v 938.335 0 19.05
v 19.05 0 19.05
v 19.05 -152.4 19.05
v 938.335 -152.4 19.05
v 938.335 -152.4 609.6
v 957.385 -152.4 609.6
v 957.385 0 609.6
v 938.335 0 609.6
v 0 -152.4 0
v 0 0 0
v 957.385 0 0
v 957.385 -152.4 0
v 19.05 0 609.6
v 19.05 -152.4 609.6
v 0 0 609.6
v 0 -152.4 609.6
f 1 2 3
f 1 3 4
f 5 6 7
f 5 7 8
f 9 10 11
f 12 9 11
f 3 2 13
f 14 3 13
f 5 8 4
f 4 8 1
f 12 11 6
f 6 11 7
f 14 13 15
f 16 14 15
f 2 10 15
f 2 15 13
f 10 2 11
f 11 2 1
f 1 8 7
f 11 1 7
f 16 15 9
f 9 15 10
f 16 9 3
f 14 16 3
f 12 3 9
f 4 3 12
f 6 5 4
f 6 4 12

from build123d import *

# Parameters (mm, degrees)
F1_DEPTH = 152.4
F0_W     = 919.2846153846
F0_H     = 19.05
F2_DEPTH = 152.4
F3_DEPTH = 152.4


with BuildPart() as f1:
    # F0 (on Front) → F1 (new body)
    with BuildSketch(Plane.XZ):
        Polygon((938.3346153846, 19.05), (938.3346153846, 0), (957.3846153846, 0), (957.3846153846, 609.6), (938.3346153846, 609.6), align=None)
    extrude(amount=F1_DEPTH)

    # F0 (on Front) → F2 (join, through all)
    with BuildSketch(Plane.XZ):
        with Locations((478.6923076923, 9.525)):
            Rectangle(F0_W, F0_H)
    extrude(amount=F2_DEPTH)

    # F0 (on Front) → F3 (join, through all)
    with BuildSketch(Plane.XZ):
        Polygon((0, 609.6), (0, 0), (19.05, 0), (19.05, 19.05), (19.05, 609.6), align=None)
    extrude(amount=F3_DEPTH)


solid = f1.part
